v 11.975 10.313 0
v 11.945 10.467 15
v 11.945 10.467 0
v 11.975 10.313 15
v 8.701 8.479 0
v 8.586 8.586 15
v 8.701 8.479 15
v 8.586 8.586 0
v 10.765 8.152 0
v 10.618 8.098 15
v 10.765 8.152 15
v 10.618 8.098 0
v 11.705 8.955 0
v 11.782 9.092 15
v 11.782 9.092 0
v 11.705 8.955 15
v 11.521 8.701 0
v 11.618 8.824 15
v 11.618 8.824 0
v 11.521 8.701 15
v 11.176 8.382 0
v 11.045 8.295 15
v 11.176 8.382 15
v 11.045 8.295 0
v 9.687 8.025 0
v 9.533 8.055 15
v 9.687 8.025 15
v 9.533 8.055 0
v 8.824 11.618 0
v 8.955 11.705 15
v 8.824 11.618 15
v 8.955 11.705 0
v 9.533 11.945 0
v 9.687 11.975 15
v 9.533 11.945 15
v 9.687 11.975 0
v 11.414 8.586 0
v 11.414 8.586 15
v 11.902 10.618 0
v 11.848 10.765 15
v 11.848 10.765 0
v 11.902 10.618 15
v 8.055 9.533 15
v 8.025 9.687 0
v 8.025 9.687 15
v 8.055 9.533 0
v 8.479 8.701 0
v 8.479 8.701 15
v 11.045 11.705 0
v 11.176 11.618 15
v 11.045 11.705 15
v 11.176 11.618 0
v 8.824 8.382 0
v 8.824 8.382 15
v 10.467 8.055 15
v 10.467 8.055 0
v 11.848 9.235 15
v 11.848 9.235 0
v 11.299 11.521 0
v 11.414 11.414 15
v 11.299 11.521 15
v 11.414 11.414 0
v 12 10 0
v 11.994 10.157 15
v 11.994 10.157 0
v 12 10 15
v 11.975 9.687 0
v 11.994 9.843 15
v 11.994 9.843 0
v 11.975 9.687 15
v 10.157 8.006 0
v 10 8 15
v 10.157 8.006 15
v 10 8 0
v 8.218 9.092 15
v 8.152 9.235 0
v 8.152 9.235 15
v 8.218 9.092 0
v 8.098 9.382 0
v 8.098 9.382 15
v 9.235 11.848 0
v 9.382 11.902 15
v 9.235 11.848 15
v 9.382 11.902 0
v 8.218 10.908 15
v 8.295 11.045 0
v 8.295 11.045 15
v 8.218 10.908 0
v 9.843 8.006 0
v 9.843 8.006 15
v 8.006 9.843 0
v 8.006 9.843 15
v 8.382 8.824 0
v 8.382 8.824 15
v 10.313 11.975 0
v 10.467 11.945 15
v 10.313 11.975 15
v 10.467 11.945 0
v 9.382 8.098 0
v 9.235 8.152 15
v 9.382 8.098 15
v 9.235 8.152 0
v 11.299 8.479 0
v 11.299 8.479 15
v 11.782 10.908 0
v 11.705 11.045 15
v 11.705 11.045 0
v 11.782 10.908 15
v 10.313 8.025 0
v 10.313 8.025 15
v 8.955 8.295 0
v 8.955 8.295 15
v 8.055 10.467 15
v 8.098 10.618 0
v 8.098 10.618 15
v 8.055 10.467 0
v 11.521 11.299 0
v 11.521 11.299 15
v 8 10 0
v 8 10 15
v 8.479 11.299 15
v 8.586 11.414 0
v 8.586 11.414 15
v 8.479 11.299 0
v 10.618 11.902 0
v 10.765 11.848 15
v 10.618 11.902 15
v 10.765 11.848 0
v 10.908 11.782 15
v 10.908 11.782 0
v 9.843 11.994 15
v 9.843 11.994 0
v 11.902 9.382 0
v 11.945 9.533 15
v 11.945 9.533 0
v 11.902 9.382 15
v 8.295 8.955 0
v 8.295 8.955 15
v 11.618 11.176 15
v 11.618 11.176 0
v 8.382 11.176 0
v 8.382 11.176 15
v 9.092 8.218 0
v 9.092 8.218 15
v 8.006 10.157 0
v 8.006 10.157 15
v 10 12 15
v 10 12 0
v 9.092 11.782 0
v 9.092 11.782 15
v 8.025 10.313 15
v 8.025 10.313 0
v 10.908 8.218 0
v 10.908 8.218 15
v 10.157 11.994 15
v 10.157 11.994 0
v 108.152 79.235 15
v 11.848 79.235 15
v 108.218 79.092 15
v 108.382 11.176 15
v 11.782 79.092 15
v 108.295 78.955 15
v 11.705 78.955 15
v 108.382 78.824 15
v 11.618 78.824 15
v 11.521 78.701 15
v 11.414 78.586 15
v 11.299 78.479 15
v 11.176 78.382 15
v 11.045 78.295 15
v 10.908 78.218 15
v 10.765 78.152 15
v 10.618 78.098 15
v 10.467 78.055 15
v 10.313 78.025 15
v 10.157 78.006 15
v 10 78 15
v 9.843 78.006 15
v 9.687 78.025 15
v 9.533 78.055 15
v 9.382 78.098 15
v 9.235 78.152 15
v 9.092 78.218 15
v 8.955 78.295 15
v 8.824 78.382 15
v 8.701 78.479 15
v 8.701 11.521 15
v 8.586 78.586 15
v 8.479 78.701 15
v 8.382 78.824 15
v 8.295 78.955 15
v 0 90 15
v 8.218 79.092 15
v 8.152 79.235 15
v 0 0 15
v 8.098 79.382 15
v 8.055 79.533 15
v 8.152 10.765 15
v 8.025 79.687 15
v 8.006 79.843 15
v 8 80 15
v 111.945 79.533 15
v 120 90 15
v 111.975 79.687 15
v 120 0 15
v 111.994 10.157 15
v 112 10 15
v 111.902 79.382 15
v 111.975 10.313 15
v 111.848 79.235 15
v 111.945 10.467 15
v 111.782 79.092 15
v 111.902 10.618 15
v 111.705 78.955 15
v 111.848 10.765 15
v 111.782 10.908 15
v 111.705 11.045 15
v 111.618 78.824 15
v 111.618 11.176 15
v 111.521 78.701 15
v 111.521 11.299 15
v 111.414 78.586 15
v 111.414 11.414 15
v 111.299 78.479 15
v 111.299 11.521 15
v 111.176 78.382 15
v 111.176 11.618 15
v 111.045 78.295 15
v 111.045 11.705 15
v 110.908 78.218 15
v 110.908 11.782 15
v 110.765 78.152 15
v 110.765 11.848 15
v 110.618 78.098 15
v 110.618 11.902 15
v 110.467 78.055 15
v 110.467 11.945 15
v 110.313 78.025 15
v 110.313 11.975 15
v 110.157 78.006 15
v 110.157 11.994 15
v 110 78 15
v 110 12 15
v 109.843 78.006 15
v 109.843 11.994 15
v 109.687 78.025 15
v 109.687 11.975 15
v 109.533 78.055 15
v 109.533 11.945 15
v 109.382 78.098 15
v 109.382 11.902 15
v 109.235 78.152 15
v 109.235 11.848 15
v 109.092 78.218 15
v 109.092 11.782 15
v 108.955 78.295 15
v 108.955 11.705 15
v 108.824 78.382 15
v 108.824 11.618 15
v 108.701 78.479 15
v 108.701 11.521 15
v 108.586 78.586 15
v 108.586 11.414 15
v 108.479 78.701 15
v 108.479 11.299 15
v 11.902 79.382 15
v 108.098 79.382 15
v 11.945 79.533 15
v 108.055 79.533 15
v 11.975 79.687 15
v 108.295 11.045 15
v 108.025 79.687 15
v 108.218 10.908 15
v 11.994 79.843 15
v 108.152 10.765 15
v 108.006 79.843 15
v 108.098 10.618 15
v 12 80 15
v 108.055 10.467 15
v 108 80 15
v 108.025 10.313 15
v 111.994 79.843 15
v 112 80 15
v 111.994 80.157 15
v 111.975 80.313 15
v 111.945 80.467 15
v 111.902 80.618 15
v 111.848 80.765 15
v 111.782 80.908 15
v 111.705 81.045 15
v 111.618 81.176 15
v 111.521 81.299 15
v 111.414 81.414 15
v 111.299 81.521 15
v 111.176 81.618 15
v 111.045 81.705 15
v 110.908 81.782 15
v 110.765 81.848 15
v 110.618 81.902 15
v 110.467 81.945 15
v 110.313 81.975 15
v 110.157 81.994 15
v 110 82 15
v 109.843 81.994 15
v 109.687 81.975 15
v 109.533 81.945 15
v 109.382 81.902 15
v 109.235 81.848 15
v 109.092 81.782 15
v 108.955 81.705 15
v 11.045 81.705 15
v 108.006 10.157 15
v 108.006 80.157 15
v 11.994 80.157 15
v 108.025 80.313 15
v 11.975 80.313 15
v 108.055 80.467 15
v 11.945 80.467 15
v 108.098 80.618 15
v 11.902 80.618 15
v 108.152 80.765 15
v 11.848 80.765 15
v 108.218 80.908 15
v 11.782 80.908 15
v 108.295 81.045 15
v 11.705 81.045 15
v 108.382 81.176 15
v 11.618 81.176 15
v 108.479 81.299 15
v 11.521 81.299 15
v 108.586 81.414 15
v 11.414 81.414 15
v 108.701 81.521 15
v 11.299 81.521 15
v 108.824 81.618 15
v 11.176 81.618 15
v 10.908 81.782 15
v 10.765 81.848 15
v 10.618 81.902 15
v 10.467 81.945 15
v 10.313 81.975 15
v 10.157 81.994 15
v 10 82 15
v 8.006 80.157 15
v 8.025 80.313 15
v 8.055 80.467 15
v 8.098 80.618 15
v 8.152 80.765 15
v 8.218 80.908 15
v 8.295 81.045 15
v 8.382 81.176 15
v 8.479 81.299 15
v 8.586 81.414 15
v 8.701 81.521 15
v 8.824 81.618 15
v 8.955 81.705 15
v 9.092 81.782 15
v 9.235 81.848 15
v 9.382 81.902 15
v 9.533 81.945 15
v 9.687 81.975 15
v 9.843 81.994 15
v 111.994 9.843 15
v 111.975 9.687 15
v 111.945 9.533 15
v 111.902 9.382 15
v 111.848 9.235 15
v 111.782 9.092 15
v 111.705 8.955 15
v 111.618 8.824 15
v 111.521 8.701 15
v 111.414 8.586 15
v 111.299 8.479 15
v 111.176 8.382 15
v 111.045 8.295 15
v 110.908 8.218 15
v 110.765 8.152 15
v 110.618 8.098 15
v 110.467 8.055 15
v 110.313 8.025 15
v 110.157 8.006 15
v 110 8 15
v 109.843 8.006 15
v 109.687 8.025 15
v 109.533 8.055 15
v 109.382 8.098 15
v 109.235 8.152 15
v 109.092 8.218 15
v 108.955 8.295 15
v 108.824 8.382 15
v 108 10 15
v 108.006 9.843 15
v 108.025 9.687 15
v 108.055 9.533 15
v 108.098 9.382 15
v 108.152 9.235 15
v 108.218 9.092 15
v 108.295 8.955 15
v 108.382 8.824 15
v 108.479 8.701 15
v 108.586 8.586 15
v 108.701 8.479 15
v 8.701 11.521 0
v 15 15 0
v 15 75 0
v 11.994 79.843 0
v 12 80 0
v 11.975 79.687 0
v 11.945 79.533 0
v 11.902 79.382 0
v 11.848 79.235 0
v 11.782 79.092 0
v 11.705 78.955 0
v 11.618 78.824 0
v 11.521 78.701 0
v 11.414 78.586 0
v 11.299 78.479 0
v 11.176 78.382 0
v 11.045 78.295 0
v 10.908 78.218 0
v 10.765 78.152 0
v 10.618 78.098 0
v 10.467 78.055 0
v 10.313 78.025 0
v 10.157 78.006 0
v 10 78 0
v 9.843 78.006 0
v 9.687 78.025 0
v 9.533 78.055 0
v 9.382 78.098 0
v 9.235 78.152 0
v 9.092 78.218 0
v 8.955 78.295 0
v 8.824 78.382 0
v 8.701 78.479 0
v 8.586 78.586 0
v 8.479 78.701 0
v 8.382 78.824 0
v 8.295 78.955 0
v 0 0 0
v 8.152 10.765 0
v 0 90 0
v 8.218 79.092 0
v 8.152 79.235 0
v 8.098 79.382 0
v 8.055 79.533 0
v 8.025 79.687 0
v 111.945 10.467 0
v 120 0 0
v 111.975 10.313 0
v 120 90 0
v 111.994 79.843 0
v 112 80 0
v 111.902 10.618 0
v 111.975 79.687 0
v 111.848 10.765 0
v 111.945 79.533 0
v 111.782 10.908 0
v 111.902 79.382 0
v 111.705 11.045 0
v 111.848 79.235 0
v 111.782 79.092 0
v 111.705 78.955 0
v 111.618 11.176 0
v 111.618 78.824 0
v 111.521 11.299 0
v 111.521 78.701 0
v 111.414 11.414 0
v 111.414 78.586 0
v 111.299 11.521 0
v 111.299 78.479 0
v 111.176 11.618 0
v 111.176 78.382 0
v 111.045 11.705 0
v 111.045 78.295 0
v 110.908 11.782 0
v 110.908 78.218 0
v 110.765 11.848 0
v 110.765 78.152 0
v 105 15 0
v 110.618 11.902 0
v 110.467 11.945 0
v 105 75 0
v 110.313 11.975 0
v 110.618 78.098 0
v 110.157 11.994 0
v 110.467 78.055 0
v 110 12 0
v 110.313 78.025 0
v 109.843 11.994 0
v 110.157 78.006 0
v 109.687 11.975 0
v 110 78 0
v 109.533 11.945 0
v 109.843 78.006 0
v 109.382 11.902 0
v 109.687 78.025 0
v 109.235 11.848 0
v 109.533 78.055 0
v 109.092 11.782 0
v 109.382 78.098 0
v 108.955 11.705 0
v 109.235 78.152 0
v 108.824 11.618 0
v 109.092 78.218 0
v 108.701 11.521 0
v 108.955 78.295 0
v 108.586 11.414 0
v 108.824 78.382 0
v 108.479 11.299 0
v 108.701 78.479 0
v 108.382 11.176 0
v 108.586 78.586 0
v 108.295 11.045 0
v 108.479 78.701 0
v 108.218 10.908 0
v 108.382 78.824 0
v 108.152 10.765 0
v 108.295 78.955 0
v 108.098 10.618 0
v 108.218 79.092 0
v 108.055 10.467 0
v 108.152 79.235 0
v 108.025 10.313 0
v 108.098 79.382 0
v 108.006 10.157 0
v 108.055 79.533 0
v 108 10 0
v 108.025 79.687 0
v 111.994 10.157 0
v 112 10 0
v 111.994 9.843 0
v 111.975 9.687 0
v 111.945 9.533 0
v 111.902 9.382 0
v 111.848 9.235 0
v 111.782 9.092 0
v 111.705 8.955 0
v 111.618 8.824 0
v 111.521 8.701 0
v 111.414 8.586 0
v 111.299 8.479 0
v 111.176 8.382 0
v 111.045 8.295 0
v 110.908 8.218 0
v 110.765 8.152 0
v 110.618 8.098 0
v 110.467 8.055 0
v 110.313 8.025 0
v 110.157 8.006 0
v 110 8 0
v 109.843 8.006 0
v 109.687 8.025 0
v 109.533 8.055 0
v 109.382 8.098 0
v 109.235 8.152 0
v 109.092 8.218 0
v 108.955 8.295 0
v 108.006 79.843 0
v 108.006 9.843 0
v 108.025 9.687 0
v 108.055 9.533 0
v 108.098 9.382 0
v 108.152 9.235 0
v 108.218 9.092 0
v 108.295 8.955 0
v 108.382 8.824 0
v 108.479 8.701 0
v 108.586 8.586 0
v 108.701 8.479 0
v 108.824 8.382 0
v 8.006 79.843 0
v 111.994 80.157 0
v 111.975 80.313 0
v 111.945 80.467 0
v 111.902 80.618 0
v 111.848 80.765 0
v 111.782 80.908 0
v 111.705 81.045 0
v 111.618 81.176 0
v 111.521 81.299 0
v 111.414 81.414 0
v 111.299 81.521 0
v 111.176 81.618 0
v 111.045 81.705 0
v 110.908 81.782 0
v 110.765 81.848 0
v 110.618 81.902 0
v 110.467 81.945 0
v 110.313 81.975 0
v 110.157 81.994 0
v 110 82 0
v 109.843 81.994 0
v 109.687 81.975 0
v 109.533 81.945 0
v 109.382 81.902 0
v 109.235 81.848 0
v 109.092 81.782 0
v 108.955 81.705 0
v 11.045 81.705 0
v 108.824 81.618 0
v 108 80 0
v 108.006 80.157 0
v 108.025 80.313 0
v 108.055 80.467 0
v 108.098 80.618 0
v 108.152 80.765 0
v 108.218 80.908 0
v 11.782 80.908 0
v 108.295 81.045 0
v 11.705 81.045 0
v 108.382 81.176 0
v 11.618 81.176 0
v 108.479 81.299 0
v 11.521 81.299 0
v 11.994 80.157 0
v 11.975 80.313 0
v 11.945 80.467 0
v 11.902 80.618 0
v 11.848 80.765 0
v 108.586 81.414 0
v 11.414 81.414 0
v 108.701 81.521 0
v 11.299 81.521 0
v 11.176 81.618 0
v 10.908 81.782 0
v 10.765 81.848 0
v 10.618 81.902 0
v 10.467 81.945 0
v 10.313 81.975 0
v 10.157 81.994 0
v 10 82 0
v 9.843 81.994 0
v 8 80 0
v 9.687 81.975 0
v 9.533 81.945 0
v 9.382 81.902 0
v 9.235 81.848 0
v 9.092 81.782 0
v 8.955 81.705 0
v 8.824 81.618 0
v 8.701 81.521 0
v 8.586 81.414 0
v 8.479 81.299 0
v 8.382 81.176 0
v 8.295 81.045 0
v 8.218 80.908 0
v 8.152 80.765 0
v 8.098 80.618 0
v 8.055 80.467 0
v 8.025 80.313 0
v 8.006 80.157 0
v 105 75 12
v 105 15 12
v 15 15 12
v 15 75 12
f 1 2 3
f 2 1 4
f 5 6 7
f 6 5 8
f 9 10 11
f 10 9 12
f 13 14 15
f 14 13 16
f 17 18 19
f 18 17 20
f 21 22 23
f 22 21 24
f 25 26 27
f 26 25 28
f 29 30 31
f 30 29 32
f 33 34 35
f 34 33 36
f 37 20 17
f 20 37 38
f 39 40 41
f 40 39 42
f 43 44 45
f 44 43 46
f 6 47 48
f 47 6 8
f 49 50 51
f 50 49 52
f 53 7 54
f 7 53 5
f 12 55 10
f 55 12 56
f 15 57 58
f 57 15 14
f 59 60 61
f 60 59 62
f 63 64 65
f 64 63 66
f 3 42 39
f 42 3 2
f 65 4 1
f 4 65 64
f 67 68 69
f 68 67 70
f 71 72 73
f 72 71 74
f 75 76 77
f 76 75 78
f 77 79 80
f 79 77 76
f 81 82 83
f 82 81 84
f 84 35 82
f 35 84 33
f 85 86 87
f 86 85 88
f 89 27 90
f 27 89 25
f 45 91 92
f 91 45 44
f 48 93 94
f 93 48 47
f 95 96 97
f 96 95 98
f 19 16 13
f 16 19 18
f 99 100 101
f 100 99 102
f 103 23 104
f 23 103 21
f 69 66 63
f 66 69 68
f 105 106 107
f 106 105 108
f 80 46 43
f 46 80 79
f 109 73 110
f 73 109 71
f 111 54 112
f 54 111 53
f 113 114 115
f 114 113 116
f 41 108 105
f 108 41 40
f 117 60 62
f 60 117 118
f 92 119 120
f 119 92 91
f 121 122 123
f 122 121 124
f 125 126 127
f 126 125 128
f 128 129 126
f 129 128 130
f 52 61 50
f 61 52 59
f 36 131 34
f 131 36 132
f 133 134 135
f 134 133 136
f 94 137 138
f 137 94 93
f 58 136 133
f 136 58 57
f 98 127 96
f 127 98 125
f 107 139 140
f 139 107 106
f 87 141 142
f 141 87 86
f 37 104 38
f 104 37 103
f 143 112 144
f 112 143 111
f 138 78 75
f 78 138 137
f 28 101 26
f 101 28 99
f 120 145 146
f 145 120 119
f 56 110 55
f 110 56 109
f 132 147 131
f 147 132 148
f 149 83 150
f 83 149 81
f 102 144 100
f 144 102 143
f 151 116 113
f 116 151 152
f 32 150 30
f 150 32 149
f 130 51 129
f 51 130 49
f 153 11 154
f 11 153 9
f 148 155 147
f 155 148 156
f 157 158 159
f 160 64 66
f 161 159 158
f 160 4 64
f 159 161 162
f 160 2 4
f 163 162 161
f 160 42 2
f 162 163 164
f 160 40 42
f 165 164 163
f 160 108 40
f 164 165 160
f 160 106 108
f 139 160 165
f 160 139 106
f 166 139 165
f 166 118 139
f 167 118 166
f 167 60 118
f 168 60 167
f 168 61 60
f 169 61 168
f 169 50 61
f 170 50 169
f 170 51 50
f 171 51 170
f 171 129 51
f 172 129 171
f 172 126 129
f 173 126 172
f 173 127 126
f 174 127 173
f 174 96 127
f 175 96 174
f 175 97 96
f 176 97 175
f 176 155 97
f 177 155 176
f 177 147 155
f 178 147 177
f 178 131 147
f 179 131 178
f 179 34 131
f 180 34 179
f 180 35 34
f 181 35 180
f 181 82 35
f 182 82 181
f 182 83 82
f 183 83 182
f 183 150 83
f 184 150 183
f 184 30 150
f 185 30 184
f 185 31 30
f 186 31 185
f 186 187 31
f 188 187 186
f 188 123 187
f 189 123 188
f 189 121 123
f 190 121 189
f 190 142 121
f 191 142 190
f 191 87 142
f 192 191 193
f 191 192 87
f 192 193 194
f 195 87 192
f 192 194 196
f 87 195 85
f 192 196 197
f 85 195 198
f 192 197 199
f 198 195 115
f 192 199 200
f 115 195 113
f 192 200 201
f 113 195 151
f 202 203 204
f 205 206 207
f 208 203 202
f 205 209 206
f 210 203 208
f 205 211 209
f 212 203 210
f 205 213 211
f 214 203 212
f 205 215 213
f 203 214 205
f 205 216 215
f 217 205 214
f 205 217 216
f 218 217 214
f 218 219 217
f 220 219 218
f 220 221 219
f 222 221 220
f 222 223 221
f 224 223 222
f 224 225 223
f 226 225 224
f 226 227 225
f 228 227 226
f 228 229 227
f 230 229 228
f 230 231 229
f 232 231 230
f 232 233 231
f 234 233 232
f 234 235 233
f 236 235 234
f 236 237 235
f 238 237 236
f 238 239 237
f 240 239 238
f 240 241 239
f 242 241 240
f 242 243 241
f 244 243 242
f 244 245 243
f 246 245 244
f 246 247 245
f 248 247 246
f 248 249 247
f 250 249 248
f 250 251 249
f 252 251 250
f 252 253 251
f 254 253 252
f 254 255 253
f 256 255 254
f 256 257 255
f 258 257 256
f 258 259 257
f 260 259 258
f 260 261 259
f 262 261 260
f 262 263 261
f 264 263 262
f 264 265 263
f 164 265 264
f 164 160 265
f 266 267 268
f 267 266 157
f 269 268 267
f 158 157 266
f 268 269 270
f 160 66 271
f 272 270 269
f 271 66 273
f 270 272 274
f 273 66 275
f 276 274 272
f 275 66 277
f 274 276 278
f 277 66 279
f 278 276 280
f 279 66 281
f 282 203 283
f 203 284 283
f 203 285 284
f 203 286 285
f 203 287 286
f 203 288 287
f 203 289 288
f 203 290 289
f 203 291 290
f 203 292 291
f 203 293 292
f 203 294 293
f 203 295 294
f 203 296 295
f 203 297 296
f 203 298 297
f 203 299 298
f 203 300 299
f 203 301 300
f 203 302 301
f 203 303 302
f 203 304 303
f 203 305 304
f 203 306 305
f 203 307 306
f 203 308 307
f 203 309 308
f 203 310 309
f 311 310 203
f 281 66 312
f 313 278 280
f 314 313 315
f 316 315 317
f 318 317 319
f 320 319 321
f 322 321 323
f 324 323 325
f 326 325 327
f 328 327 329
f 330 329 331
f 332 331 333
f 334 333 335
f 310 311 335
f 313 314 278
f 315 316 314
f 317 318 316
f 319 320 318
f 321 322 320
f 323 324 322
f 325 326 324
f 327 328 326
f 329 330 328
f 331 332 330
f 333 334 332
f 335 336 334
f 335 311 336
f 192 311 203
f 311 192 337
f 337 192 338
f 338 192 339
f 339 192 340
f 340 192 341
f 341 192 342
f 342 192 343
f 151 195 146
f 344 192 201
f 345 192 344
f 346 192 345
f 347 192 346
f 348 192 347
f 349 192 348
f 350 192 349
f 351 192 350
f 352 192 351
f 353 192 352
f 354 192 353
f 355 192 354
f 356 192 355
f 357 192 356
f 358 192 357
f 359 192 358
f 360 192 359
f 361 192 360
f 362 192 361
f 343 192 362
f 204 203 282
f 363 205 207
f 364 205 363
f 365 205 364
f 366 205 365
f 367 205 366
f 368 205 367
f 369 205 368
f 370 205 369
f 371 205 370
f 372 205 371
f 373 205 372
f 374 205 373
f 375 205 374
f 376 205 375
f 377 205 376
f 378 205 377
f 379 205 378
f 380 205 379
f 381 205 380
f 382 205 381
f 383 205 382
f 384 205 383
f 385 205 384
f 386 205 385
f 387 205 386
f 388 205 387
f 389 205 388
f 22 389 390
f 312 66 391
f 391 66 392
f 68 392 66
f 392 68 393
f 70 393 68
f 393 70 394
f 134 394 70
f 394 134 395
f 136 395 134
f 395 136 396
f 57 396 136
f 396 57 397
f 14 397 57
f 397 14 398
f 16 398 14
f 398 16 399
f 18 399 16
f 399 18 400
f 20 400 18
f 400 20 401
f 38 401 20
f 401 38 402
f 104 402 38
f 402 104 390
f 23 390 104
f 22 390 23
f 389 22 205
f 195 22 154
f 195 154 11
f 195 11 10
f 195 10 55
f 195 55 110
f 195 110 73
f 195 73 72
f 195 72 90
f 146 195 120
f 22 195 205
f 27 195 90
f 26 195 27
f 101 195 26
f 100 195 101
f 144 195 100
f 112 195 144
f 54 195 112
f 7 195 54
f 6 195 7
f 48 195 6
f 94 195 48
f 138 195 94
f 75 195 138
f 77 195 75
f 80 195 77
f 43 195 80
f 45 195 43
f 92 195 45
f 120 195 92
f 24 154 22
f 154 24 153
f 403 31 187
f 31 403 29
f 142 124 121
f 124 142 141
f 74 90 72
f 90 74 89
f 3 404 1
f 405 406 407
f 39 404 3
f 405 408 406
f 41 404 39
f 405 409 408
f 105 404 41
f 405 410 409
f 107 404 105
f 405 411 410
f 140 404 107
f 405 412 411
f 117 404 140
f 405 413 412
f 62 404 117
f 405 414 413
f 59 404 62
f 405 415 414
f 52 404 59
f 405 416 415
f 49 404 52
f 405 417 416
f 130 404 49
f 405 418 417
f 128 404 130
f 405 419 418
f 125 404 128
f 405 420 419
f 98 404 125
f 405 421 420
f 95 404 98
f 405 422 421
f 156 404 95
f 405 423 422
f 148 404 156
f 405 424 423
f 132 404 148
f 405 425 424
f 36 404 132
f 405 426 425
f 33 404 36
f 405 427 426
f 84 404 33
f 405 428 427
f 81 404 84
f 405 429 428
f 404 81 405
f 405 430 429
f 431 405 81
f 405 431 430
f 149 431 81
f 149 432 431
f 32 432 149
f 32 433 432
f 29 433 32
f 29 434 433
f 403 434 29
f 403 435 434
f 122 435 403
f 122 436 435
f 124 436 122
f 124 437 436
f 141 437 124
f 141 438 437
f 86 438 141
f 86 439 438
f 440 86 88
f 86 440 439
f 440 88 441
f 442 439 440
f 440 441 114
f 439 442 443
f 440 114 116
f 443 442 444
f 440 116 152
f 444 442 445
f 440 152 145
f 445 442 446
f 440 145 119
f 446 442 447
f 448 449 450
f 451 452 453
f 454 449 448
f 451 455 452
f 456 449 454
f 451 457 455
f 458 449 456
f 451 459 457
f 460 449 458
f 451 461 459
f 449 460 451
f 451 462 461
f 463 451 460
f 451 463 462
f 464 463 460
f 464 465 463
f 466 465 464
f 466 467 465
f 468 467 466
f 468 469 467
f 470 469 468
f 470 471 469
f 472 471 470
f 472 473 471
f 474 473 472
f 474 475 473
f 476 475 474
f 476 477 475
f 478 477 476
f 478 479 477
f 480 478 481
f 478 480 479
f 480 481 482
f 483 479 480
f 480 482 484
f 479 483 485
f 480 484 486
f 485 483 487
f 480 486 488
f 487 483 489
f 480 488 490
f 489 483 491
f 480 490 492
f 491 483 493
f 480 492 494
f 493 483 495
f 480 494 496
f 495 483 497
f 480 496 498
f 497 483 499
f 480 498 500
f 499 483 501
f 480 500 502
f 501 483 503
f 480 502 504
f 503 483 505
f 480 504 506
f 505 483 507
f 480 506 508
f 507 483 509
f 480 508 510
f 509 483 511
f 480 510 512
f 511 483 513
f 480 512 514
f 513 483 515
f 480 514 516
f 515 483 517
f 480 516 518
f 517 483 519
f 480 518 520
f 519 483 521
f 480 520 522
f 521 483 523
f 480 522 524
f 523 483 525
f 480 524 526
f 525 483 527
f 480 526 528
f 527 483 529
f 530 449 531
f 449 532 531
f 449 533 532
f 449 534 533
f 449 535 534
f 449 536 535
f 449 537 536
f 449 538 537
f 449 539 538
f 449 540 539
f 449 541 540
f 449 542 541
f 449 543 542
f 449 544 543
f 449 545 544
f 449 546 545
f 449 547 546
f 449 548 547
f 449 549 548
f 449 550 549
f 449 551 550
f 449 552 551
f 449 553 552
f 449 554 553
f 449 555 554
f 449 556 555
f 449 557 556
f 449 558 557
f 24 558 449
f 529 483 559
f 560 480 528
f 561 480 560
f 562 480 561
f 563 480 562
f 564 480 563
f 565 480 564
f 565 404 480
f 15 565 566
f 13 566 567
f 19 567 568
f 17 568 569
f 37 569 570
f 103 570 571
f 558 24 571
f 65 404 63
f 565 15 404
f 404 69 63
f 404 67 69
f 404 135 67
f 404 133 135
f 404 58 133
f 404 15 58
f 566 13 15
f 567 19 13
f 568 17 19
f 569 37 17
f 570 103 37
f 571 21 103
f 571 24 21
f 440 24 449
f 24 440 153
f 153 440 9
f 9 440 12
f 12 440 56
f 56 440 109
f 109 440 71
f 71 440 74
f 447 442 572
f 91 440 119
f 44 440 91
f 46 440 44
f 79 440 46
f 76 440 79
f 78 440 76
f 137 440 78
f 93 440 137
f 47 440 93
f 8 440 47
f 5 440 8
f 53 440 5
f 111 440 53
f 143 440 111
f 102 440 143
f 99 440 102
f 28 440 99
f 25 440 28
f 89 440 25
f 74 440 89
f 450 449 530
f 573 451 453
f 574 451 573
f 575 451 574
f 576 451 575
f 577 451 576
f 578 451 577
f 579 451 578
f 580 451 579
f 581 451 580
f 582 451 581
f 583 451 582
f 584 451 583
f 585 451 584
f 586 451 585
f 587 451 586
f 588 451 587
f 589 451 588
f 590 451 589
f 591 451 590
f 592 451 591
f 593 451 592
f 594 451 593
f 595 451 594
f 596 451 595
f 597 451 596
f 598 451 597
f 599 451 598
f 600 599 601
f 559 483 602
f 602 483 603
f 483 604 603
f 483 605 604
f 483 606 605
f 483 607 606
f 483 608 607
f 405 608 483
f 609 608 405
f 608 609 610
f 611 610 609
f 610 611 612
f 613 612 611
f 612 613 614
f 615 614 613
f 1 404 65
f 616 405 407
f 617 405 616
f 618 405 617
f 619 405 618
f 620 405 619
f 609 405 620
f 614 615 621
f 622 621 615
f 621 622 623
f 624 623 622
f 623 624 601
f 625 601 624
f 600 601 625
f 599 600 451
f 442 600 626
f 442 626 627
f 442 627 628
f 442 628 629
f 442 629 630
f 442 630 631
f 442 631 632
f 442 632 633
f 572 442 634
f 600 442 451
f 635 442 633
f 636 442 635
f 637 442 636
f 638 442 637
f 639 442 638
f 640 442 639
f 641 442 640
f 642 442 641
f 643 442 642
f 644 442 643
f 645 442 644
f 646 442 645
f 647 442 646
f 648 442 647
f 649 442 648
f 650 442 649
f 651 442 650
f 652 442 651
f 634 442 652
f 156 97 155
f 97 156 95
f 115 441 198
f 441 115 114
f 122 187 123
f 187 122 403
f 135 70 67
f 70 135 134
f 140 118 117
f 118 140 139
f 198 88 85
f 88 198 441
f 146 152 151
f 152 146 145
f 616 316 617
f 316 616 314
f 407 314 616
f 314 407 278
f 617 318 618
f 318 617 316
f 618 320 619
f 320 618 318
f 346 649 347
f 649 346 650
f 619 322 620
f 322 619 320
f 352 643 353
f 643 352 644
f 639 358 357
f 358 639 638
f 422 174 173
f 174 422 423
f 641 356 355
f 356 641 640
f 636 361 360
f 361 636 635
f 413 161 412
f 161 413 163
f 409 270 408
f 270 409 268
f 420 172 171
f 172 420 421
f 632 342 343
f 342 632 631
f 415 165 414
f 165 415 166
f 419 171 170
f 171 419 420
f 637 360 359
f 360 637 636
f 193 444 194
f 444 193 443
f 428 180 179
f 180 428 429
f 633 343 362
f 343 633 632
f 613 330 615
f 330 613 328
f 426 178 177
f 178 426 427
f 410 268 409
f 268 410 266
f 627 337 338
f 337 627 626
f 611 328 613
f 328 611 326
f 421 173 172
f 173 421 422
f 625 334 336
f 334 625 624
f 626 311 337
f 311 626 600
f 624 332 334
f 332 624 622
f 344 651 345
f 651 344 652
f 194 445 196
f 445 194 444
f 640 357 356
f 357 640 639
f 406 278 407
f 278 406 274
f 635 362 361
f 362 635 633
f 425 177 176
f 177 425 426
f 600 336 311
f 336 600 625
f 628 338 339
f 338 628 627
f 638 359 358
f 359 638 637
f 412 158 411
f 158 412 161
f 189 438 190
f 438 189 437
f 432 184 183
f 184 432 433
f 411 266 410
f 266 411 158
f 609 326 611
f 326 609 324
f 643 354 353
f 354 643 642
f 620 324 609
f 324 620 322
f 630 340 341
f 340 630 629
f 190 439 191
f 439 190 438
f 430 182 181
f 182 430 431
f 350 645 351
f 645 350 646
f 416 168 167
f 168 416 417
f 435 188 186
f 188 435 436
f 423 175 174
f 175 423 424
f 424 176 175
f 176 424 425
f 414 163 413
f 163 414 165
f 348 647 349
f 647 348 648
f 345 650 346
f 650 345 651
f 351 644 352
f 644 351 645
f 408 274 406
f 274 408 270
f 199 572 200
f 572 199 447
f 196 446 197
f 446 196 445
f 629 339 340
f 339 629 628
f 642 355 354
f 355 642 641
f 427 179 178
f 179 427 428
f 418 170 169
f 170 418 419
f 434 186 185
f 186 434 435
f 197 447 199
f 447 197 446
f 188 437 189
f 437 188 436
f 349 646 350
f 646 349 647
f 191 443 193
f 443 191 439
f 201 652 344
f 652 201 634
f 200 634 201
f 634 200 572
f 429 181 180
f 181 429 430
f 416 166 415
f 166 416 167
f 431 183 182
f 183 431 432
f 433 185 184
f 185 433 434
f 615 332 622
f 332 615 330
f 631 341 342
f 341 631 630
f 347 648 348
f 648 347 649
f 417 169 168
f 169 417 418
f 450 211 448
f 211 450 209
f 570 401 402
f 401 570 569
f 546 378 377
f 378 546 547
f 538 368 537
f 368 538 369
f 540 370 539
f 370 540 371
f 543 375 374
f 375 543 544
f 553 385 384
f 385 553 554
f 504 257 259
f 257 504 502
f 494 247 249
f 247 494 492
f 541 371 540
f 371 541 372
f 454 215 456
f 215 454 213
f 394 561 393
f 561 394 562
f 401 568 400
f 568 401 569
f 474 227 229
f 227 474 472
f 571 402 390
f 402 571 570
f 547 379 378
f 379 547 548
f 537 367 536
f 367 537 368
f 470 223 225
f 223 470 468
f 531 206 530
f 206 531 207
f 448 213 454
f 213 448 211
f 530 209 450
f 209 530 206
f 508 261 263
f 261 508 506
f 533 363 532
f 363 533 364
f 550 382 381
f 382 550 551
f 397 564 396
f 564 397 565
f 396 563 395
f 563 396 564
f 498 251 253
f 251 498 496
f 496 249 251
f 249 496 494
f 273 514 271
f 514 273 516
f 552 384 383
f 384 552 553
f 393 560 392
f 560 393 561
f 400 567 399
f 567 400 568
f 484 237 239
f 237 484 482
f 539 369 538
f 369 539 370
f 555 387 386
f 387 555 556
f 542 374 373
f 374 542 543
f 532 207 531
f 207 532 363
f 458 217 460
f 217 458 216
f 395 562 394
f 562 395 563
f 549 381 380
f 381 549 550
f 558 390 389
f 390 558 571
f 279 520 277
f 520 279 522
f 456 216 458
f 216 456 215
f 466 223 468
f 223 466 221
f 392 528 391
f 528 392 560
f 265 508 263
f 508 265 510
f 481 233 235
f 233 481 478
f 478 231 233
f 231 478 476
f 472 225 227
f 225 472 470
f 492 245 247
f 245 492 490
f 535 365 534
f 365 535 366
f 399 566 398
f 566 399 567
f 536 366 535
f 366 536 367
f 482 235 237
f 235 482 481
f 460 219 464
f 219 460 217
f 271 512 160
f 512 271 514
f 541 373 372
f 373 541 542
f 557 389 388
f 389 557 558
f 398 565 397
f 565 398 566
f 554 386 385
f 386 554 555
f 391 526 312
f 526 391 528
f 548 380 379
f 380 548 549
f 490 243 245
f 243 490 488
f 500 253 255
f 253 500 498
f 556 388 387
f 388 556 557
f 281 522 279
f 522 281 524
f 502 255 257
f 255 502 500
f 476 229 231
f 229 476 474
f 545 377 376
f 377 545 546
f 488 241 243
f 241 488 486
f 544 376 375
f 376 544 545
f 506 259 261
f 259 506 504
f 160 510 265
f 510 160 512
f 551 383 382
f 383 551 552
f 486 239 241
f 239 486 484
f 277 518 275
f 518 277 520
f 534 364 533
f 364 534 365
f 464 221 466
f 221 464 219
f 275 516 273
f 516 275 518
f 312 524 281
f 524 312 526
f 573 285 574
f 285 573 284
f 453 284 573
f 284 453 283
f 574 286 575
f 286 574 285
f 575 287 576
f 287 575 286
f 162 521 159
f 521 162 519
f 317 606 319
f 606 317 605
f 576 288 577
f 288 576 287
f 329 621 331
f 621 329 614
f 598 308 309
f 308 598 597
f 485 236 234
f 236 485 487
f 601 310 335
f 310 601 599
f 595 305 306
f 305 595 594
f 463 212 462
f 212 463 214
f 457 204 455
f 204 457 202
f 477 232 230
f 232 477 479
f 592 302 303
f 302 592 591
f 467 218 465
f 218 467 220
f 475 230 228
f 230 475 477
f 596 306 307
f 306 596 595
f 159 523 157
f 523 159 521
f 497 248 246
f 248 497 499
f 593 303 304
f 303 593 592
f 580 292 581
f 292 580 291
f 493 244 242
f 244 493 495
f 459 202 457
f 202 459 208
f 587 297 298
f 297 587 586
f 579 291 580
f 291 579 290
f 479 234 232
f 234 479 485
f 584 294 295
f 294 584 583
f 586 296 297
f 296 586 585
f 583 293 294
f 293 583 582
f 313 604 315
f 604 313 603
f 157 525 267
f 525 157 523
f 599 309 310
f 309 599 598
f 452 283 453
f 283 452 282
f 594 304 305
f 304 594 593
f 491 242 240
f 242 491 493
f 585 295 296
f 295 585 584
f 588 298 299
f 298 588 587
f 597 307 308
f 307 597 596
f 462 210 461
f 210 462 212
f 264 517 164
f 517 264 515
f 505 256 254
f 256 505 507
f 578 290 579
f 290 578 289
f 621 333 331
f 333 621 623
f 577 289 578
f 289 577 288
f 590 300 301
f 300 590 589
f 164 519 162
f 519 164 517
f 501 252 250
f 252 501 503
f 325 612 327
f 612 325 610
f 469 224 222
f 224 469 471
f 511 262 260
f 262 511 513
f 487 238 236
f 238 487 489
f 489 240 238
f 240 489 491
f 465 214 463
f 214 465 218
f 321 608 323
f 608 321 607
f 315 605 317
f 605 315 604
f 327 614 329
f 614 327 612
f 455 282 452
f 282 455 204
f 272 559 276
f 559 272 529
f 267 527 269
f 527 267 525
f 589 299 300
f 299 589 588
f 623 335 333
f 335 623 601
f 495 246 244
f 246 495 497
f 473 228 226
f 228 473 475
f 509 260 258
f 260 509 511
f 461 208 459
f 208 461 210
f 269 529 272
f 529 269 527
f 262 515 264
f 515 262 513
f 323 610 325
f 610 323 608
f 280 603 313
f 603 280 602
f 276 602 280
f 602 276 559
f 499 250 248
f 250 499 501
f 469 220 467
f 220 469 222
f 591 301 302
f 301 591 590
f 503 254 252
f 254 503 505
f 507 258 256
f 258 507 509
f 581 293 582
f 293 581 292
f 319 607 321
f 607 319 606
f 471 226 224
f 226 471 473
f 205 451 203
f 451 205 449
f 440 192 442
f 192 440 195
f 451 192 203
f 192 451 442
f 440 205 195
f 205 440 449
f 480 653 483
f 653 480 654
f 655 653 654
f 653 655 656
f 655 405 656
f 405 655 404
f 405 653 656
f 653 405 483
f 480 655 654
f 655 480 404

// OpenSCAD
// EcoNote+ Enclosure Bottom
$fn=80;
difference() {
  cube([120, 90, 15], center=false); // Base block
  translate([15, 15, 0]) cube([90, 60, 12]); // main cavity
  // screw holes
  for (x = [10, 110]) {
    for (y = [10, 80]) {
      translate([x, y, 0]) cylinder(h=15, r=2);
    }
  }
}
